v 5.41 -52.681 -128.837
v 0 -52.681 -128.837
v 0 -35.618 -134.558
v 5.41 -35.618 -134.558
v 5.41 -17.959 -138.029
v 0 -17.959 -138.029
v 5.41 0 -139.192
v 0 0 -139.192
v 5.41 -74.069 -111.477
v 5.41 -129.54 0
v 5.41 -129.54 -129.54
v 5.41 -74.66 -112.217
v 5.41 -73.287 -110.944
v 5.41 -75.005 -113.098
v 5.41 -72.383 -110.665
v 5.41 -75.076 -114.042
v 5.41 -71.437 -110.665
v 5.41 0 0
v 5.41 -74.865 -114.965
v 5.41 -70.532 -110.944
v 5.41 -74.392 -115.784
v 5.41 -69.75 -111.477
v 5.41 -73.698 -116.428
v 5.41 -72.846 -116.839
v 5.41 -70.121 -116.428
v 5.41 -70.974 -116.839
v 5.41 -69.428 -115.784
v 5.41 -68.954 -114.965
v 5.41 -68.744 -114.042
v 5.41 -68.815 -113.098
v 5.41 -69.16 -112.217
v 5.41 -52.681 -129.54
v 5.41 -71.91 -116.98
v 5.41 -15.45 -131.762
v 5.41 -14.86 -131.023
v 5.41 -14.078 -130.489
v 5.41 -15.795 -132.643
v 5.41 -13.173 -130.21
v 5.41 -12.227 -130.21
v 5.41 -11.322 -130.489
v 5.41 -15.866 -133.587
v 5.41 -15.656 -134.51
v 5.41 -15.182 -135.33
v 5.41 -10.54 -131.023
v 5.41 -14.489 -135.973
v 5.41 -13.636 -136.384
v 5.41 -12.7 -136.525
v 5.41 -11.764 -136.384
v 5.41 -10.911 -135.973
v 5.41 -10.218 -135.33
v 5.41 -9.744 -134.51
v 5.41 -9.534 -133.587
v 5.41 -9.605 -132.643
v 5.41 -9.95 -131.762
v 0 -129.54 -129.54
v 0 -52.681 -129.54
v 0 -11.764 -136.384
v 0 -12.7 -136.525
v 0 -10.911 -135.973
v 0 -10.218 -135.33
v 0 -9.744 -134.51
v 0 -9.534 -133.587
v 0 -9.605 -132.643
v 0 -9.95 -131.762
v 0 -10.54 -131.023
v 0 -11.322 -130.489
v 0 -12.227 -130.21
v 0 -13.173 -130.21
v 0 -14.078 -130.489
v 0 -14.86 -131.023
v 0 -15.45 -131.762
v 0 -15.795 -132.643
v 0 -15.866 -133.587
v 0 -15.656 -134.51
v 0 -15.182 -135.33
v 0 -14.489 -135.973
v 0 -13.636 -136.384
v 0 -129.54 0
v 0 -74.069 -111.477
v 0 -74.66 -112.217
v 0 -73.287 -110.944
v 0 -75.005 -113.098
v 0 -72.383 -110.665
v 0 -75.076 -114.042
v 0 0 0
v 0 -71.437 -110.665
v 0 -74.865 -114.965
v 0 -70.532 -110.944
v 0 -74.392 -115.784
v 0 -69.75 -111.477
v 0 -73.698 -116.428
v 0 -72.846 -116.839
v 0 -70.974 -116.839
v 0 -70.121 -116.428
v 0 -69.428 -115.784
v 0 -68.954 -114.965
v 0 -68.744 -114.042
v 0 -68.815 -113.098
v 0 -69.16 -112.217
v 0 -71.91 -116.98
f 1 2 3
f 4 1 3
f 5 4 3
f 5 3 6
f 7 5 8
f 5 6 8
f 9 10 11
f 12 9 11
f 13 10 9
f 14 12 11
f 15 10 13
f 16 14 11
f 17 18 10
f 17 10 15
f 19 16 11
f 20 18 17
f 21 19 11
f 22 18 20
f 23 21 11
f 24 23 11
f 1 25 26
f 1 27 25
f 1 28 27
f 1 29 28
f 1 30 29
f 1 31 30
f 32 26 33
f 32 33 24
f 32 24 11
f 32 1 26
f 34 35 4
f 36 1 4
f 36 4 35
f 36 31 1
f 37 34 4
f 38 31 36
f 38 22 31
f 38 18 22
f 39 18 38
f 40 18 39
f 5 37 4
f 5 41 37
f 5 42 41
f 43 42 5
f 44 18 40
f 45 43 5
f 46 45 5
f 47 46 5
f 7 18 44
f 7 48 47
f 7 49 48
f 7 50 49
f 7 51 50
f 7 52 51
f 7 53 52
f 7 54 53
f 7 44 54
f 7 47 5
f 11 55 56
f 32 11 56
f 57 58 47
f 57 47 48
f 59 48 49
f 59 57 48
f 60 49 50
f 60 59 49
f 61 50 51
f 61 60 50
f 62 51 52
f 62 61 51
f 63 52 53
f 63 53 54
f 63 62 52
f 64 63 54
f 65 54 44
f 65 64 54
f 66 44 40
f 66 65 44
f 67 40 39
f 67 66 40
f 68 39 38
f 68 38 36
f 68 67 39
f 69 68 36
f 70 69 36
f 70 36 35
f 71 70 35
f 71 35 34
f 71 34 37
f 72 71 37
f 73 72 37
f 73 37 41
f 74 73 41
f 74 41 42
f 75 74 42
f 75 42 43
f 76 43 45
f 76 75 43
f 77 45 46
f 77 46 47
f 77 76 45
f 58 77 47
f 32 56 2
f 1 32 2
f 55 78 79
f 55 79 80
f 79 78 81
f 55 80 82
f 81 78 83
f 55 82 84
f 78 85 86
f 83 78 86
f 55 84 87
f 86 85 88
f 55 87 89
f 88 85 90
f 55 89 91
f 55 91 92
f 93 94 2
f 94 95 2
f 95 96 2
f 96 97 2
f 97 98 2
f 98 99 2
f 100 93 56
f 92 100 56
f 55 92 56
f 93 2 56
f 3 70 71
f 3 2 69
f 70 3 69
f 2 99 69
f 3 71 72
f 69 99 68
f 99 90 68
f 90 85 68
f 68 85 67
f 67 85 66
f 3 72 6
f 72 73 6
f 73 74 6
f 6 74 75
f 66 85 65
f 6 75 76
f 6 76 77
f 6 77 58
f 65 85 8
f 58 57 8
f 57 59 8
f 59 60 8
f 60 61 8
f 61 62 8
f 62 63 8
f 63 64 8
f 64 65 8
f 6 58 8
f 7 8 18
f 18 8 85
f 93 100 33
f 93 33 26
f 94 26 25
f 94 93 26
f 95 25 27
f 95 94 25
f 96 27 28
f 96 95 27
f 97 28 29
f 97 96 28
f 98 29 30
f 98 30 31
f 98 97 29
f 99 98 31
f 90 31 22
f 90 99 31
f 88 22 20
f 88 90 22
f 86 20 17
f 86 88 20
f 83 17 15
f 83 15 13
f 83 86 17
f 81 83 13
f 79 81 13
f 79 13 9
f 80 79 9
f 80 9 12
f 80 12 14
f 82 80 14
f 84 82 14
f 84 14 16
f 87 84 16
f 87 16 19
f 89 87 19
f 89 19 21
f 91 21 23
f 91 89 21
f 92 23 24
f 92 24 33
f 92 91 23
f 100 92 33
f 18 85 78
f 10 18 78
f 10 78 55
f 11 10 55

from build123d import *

# Parameters (mm, degrees)
SKETCH1_R           = 3.175
BOSS_EXTRUDE2_DEPTH = 5.4102


with BuildPart() as part:
    # Sketch1 → Boss-Extrude2 (new body)
    with BuildSketch(Plane(origin=(0, 0, 0), x_dir=(0, 0, -1), z_dir=(1, 0, 0))):
        with BuildLine():
            Line((139.192, 0), (0, 0))
            Line((0, 0), (0, -129.54))
            Line((0, -129.54), (129.54, -129.54))
            Line((129.54, -129.54), (129.54, -52.681426173))
            Line((129.54, -52.681426173), (128.837417703, -52.681426173))
            ThreePointArc((128.837417703, -52.681426173), (136.578824693, -26.844692391), (139.192, 0))
        make_face()
        with Locations((113.804702463, -71.909902638)):
            Circle(SKETCH1_R, mode=Mode.SUBTRACT)
        with Locations((133.35, -12.7)):
            Circle(SKETCH1_R, mode=Mode.SUBTRACT)
    extrude(amount=BOSS_EXTRUDE2_DEPTH)


solid = part.part
